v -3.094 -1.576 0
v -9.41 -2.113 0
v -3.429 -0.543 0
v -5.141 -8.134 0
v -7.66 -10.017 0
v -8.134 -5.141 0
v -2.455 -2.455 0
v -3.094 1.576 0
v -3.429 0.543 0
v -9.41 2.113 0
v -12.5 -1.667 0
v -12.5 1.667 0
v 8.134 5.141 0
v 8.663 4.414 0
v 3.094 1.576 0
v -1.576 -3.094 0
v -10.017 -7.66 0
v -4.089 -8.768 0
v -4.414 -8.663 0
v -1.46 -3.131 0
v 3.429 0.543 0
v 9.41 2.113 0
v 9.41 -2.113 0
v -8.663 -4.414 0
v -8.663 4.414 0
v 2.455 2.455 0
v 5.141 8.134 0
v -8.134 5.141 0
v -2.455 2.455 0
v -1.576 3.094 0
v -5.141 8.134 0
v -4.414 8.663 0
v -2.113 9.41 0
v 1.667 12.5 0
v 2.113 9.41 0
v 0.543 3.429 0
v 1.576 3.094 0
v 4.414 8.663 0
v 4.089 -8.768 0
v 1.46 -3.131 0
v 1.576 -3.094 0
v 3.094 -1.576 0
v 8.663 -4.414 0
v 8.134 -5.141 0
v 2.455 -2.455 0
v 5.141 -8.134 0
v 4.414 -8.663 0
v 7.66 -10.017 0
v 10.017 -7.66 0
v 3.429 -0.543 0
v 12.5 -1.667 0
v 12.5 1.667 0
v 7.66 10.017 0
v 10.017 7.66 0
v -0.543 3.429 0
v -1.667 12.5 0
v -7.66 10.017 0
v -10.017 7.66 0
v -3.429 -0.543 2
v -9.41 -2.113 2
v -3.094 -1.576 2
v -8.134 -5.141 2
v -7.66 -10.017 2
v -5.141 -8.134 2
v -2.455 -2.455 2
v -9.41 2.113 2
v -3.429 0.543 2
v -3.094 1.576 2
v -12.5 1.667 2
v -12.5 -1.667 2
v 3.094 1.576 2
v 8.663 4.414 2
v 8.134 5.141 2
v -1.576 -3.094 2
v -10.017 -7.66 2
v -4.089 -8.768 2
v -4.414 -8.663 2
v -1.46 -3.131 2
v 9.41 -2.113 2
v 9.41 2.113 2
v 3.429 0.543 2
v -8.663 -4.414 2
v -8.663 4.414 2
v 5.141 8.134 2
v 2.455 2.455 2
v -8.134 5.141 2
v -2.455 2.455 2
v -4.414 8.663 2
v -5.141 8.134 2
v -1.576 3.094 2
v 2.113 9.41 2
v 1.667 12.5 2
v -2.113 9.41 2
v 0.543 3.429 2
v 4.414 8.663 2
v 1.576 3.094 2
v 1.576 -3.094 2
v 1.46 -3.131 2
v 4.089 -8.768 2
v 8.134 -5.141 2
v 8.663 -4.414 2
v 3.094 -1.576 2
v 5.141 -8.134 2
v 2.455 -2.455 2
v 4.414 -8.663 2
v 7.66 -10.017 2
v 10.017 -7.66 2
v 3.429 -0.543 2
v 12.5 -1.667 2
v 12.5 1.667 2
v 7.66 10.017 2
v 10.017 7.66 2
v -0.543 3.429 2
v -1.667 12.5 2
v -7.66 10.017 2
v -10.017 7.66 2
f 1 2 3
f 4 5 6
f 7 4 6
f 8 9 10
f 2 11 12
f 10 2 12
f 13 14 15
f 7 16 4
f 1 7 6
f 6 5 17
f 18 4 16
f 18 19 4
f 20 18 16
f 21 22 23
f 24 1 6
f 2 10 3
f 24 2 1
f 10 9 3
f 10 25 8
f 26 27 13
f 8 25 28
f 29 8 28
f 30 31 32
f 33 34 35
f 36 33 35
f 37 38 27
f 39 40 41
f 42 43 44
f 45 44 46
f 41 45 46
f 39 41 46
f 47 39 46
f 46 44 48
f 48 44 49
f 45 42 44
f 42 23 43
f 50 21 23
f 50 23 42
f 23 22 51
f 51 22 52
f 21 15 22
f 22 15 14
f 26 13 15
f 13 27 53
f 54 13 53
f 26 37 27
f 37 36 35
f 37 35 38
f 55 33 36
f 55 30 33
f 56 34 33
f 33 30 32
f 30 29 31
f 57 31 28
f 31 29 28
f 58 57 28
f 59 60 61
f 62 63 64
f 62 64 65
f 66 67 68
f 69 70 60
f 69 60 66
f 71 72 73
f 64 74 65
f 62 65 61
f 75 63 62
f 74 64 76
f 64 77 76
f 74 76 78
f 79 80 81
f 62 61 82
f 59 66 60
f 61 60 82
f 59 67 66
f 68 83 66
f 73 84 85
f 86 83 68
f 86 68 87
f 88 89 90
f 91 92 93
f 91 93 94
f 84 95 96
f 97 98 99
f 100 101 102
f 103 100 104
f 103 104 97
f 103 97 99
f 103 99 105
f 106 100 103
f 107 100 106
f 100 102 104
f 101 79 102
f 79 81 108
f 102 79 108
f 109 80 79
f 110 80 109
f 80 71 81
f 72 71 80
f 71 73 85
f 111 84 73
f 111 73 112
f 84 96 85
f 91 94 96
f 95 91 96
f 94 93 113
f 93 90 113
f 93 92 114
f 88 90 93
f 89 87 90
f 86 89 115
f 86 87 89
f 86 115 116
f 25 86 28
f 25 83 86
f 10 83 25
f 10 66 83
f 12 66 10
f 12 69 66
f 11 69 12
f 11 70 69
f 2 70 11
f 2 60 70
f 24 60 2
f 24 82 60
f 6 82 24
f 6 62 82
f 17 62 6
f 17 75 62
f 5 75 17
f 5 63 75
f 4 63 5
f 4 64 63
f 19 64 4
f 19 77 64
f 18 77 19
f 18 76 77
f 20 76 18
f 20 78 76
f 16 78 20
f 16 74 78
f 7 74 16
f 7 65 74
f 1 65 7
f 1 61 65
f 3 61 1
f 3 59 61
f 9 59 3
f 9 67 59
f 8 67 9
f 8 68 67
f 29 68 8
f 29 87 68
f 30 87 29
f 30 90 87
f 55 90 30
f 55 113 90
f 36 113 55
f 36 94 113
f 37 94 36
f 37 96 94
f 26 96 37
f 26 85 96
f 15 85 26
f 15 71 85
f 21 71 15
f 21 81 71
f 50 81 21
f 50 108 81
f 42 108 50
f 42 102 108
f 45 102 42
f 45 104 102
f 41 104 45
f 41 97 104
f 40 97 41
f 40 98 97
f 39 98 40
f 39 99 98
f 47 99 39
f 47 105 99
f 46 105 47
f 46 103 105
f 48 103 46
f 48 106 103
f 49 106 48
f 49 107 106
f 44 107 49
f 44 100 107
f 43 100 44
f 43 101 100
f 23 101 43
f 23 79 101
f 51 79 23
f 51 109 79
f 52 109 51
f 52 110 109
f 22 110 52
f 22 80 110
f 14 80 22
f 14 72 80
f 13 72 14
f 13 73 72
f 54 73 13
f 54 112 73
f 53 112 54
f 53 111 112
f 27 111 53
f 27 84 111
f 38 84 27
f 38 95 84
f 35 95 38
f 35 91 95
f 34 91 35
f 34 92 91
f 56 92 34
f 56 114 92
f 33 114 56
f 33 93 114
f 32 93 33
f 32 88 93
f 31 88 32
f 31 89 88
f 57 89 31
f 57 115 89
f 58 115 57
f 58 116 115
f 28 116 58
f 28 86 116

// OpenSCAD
// OSHW Logo Generator
// Open Source Hardware Logo : http://oshwlogo.com/
// -------------------------------------------------
//
// Adapted from Adrew Plumb/ClothBot original version
// just change internal parameters to made dimension control easier
// a single parameter : logo diameter (millimeters)
//
// oshw_logo_2D(diameter) generate a 2D logo with diameter requested
// just have to extrude to get a 3D version, then add it to your objects
//
// cc-by-sa, pierre-alain dorange, july 2012

module gear_tooth_2d(d)
{
    polygon(points = [
        [ 0.0, 10.0 * d / 72.0 ],
        [ 0.5 * d, d / 15.0 ],
        [ 0.5 * d, -d / 15.0 ],
        [ 0.0, -10.0 * d / 72.0 ]
    ]);
}

module oshw_logo_2d(d = 10.0)
{
    rotate(-135)
    {
        difference()
        {
            union()
            {
                circle(r = 14.0 * d / 36.0, $fn = 20);
                for (i = [1:7])
                    assign(rotAngle = 45 * i + 45) rotate(rotAngle)
                        gear_tooth_2d(d);
            }
            circle(r = 10.0 * d / 72.0, $fn = 20);
            intersection()
            {
                rotate(-20) square(size = [ 10.0 * d / 18.0, 10.0 * d / 18.0 ]);
                rotate(20) square(size = [ 10.0 * d / 18.0, 10.0 * d / 18.0 ]);
            }
        }
    }
}

// usage : oshw_logo_2d(diameter)

linear_extrude(height = 2) oshw_logo_2d(25);
